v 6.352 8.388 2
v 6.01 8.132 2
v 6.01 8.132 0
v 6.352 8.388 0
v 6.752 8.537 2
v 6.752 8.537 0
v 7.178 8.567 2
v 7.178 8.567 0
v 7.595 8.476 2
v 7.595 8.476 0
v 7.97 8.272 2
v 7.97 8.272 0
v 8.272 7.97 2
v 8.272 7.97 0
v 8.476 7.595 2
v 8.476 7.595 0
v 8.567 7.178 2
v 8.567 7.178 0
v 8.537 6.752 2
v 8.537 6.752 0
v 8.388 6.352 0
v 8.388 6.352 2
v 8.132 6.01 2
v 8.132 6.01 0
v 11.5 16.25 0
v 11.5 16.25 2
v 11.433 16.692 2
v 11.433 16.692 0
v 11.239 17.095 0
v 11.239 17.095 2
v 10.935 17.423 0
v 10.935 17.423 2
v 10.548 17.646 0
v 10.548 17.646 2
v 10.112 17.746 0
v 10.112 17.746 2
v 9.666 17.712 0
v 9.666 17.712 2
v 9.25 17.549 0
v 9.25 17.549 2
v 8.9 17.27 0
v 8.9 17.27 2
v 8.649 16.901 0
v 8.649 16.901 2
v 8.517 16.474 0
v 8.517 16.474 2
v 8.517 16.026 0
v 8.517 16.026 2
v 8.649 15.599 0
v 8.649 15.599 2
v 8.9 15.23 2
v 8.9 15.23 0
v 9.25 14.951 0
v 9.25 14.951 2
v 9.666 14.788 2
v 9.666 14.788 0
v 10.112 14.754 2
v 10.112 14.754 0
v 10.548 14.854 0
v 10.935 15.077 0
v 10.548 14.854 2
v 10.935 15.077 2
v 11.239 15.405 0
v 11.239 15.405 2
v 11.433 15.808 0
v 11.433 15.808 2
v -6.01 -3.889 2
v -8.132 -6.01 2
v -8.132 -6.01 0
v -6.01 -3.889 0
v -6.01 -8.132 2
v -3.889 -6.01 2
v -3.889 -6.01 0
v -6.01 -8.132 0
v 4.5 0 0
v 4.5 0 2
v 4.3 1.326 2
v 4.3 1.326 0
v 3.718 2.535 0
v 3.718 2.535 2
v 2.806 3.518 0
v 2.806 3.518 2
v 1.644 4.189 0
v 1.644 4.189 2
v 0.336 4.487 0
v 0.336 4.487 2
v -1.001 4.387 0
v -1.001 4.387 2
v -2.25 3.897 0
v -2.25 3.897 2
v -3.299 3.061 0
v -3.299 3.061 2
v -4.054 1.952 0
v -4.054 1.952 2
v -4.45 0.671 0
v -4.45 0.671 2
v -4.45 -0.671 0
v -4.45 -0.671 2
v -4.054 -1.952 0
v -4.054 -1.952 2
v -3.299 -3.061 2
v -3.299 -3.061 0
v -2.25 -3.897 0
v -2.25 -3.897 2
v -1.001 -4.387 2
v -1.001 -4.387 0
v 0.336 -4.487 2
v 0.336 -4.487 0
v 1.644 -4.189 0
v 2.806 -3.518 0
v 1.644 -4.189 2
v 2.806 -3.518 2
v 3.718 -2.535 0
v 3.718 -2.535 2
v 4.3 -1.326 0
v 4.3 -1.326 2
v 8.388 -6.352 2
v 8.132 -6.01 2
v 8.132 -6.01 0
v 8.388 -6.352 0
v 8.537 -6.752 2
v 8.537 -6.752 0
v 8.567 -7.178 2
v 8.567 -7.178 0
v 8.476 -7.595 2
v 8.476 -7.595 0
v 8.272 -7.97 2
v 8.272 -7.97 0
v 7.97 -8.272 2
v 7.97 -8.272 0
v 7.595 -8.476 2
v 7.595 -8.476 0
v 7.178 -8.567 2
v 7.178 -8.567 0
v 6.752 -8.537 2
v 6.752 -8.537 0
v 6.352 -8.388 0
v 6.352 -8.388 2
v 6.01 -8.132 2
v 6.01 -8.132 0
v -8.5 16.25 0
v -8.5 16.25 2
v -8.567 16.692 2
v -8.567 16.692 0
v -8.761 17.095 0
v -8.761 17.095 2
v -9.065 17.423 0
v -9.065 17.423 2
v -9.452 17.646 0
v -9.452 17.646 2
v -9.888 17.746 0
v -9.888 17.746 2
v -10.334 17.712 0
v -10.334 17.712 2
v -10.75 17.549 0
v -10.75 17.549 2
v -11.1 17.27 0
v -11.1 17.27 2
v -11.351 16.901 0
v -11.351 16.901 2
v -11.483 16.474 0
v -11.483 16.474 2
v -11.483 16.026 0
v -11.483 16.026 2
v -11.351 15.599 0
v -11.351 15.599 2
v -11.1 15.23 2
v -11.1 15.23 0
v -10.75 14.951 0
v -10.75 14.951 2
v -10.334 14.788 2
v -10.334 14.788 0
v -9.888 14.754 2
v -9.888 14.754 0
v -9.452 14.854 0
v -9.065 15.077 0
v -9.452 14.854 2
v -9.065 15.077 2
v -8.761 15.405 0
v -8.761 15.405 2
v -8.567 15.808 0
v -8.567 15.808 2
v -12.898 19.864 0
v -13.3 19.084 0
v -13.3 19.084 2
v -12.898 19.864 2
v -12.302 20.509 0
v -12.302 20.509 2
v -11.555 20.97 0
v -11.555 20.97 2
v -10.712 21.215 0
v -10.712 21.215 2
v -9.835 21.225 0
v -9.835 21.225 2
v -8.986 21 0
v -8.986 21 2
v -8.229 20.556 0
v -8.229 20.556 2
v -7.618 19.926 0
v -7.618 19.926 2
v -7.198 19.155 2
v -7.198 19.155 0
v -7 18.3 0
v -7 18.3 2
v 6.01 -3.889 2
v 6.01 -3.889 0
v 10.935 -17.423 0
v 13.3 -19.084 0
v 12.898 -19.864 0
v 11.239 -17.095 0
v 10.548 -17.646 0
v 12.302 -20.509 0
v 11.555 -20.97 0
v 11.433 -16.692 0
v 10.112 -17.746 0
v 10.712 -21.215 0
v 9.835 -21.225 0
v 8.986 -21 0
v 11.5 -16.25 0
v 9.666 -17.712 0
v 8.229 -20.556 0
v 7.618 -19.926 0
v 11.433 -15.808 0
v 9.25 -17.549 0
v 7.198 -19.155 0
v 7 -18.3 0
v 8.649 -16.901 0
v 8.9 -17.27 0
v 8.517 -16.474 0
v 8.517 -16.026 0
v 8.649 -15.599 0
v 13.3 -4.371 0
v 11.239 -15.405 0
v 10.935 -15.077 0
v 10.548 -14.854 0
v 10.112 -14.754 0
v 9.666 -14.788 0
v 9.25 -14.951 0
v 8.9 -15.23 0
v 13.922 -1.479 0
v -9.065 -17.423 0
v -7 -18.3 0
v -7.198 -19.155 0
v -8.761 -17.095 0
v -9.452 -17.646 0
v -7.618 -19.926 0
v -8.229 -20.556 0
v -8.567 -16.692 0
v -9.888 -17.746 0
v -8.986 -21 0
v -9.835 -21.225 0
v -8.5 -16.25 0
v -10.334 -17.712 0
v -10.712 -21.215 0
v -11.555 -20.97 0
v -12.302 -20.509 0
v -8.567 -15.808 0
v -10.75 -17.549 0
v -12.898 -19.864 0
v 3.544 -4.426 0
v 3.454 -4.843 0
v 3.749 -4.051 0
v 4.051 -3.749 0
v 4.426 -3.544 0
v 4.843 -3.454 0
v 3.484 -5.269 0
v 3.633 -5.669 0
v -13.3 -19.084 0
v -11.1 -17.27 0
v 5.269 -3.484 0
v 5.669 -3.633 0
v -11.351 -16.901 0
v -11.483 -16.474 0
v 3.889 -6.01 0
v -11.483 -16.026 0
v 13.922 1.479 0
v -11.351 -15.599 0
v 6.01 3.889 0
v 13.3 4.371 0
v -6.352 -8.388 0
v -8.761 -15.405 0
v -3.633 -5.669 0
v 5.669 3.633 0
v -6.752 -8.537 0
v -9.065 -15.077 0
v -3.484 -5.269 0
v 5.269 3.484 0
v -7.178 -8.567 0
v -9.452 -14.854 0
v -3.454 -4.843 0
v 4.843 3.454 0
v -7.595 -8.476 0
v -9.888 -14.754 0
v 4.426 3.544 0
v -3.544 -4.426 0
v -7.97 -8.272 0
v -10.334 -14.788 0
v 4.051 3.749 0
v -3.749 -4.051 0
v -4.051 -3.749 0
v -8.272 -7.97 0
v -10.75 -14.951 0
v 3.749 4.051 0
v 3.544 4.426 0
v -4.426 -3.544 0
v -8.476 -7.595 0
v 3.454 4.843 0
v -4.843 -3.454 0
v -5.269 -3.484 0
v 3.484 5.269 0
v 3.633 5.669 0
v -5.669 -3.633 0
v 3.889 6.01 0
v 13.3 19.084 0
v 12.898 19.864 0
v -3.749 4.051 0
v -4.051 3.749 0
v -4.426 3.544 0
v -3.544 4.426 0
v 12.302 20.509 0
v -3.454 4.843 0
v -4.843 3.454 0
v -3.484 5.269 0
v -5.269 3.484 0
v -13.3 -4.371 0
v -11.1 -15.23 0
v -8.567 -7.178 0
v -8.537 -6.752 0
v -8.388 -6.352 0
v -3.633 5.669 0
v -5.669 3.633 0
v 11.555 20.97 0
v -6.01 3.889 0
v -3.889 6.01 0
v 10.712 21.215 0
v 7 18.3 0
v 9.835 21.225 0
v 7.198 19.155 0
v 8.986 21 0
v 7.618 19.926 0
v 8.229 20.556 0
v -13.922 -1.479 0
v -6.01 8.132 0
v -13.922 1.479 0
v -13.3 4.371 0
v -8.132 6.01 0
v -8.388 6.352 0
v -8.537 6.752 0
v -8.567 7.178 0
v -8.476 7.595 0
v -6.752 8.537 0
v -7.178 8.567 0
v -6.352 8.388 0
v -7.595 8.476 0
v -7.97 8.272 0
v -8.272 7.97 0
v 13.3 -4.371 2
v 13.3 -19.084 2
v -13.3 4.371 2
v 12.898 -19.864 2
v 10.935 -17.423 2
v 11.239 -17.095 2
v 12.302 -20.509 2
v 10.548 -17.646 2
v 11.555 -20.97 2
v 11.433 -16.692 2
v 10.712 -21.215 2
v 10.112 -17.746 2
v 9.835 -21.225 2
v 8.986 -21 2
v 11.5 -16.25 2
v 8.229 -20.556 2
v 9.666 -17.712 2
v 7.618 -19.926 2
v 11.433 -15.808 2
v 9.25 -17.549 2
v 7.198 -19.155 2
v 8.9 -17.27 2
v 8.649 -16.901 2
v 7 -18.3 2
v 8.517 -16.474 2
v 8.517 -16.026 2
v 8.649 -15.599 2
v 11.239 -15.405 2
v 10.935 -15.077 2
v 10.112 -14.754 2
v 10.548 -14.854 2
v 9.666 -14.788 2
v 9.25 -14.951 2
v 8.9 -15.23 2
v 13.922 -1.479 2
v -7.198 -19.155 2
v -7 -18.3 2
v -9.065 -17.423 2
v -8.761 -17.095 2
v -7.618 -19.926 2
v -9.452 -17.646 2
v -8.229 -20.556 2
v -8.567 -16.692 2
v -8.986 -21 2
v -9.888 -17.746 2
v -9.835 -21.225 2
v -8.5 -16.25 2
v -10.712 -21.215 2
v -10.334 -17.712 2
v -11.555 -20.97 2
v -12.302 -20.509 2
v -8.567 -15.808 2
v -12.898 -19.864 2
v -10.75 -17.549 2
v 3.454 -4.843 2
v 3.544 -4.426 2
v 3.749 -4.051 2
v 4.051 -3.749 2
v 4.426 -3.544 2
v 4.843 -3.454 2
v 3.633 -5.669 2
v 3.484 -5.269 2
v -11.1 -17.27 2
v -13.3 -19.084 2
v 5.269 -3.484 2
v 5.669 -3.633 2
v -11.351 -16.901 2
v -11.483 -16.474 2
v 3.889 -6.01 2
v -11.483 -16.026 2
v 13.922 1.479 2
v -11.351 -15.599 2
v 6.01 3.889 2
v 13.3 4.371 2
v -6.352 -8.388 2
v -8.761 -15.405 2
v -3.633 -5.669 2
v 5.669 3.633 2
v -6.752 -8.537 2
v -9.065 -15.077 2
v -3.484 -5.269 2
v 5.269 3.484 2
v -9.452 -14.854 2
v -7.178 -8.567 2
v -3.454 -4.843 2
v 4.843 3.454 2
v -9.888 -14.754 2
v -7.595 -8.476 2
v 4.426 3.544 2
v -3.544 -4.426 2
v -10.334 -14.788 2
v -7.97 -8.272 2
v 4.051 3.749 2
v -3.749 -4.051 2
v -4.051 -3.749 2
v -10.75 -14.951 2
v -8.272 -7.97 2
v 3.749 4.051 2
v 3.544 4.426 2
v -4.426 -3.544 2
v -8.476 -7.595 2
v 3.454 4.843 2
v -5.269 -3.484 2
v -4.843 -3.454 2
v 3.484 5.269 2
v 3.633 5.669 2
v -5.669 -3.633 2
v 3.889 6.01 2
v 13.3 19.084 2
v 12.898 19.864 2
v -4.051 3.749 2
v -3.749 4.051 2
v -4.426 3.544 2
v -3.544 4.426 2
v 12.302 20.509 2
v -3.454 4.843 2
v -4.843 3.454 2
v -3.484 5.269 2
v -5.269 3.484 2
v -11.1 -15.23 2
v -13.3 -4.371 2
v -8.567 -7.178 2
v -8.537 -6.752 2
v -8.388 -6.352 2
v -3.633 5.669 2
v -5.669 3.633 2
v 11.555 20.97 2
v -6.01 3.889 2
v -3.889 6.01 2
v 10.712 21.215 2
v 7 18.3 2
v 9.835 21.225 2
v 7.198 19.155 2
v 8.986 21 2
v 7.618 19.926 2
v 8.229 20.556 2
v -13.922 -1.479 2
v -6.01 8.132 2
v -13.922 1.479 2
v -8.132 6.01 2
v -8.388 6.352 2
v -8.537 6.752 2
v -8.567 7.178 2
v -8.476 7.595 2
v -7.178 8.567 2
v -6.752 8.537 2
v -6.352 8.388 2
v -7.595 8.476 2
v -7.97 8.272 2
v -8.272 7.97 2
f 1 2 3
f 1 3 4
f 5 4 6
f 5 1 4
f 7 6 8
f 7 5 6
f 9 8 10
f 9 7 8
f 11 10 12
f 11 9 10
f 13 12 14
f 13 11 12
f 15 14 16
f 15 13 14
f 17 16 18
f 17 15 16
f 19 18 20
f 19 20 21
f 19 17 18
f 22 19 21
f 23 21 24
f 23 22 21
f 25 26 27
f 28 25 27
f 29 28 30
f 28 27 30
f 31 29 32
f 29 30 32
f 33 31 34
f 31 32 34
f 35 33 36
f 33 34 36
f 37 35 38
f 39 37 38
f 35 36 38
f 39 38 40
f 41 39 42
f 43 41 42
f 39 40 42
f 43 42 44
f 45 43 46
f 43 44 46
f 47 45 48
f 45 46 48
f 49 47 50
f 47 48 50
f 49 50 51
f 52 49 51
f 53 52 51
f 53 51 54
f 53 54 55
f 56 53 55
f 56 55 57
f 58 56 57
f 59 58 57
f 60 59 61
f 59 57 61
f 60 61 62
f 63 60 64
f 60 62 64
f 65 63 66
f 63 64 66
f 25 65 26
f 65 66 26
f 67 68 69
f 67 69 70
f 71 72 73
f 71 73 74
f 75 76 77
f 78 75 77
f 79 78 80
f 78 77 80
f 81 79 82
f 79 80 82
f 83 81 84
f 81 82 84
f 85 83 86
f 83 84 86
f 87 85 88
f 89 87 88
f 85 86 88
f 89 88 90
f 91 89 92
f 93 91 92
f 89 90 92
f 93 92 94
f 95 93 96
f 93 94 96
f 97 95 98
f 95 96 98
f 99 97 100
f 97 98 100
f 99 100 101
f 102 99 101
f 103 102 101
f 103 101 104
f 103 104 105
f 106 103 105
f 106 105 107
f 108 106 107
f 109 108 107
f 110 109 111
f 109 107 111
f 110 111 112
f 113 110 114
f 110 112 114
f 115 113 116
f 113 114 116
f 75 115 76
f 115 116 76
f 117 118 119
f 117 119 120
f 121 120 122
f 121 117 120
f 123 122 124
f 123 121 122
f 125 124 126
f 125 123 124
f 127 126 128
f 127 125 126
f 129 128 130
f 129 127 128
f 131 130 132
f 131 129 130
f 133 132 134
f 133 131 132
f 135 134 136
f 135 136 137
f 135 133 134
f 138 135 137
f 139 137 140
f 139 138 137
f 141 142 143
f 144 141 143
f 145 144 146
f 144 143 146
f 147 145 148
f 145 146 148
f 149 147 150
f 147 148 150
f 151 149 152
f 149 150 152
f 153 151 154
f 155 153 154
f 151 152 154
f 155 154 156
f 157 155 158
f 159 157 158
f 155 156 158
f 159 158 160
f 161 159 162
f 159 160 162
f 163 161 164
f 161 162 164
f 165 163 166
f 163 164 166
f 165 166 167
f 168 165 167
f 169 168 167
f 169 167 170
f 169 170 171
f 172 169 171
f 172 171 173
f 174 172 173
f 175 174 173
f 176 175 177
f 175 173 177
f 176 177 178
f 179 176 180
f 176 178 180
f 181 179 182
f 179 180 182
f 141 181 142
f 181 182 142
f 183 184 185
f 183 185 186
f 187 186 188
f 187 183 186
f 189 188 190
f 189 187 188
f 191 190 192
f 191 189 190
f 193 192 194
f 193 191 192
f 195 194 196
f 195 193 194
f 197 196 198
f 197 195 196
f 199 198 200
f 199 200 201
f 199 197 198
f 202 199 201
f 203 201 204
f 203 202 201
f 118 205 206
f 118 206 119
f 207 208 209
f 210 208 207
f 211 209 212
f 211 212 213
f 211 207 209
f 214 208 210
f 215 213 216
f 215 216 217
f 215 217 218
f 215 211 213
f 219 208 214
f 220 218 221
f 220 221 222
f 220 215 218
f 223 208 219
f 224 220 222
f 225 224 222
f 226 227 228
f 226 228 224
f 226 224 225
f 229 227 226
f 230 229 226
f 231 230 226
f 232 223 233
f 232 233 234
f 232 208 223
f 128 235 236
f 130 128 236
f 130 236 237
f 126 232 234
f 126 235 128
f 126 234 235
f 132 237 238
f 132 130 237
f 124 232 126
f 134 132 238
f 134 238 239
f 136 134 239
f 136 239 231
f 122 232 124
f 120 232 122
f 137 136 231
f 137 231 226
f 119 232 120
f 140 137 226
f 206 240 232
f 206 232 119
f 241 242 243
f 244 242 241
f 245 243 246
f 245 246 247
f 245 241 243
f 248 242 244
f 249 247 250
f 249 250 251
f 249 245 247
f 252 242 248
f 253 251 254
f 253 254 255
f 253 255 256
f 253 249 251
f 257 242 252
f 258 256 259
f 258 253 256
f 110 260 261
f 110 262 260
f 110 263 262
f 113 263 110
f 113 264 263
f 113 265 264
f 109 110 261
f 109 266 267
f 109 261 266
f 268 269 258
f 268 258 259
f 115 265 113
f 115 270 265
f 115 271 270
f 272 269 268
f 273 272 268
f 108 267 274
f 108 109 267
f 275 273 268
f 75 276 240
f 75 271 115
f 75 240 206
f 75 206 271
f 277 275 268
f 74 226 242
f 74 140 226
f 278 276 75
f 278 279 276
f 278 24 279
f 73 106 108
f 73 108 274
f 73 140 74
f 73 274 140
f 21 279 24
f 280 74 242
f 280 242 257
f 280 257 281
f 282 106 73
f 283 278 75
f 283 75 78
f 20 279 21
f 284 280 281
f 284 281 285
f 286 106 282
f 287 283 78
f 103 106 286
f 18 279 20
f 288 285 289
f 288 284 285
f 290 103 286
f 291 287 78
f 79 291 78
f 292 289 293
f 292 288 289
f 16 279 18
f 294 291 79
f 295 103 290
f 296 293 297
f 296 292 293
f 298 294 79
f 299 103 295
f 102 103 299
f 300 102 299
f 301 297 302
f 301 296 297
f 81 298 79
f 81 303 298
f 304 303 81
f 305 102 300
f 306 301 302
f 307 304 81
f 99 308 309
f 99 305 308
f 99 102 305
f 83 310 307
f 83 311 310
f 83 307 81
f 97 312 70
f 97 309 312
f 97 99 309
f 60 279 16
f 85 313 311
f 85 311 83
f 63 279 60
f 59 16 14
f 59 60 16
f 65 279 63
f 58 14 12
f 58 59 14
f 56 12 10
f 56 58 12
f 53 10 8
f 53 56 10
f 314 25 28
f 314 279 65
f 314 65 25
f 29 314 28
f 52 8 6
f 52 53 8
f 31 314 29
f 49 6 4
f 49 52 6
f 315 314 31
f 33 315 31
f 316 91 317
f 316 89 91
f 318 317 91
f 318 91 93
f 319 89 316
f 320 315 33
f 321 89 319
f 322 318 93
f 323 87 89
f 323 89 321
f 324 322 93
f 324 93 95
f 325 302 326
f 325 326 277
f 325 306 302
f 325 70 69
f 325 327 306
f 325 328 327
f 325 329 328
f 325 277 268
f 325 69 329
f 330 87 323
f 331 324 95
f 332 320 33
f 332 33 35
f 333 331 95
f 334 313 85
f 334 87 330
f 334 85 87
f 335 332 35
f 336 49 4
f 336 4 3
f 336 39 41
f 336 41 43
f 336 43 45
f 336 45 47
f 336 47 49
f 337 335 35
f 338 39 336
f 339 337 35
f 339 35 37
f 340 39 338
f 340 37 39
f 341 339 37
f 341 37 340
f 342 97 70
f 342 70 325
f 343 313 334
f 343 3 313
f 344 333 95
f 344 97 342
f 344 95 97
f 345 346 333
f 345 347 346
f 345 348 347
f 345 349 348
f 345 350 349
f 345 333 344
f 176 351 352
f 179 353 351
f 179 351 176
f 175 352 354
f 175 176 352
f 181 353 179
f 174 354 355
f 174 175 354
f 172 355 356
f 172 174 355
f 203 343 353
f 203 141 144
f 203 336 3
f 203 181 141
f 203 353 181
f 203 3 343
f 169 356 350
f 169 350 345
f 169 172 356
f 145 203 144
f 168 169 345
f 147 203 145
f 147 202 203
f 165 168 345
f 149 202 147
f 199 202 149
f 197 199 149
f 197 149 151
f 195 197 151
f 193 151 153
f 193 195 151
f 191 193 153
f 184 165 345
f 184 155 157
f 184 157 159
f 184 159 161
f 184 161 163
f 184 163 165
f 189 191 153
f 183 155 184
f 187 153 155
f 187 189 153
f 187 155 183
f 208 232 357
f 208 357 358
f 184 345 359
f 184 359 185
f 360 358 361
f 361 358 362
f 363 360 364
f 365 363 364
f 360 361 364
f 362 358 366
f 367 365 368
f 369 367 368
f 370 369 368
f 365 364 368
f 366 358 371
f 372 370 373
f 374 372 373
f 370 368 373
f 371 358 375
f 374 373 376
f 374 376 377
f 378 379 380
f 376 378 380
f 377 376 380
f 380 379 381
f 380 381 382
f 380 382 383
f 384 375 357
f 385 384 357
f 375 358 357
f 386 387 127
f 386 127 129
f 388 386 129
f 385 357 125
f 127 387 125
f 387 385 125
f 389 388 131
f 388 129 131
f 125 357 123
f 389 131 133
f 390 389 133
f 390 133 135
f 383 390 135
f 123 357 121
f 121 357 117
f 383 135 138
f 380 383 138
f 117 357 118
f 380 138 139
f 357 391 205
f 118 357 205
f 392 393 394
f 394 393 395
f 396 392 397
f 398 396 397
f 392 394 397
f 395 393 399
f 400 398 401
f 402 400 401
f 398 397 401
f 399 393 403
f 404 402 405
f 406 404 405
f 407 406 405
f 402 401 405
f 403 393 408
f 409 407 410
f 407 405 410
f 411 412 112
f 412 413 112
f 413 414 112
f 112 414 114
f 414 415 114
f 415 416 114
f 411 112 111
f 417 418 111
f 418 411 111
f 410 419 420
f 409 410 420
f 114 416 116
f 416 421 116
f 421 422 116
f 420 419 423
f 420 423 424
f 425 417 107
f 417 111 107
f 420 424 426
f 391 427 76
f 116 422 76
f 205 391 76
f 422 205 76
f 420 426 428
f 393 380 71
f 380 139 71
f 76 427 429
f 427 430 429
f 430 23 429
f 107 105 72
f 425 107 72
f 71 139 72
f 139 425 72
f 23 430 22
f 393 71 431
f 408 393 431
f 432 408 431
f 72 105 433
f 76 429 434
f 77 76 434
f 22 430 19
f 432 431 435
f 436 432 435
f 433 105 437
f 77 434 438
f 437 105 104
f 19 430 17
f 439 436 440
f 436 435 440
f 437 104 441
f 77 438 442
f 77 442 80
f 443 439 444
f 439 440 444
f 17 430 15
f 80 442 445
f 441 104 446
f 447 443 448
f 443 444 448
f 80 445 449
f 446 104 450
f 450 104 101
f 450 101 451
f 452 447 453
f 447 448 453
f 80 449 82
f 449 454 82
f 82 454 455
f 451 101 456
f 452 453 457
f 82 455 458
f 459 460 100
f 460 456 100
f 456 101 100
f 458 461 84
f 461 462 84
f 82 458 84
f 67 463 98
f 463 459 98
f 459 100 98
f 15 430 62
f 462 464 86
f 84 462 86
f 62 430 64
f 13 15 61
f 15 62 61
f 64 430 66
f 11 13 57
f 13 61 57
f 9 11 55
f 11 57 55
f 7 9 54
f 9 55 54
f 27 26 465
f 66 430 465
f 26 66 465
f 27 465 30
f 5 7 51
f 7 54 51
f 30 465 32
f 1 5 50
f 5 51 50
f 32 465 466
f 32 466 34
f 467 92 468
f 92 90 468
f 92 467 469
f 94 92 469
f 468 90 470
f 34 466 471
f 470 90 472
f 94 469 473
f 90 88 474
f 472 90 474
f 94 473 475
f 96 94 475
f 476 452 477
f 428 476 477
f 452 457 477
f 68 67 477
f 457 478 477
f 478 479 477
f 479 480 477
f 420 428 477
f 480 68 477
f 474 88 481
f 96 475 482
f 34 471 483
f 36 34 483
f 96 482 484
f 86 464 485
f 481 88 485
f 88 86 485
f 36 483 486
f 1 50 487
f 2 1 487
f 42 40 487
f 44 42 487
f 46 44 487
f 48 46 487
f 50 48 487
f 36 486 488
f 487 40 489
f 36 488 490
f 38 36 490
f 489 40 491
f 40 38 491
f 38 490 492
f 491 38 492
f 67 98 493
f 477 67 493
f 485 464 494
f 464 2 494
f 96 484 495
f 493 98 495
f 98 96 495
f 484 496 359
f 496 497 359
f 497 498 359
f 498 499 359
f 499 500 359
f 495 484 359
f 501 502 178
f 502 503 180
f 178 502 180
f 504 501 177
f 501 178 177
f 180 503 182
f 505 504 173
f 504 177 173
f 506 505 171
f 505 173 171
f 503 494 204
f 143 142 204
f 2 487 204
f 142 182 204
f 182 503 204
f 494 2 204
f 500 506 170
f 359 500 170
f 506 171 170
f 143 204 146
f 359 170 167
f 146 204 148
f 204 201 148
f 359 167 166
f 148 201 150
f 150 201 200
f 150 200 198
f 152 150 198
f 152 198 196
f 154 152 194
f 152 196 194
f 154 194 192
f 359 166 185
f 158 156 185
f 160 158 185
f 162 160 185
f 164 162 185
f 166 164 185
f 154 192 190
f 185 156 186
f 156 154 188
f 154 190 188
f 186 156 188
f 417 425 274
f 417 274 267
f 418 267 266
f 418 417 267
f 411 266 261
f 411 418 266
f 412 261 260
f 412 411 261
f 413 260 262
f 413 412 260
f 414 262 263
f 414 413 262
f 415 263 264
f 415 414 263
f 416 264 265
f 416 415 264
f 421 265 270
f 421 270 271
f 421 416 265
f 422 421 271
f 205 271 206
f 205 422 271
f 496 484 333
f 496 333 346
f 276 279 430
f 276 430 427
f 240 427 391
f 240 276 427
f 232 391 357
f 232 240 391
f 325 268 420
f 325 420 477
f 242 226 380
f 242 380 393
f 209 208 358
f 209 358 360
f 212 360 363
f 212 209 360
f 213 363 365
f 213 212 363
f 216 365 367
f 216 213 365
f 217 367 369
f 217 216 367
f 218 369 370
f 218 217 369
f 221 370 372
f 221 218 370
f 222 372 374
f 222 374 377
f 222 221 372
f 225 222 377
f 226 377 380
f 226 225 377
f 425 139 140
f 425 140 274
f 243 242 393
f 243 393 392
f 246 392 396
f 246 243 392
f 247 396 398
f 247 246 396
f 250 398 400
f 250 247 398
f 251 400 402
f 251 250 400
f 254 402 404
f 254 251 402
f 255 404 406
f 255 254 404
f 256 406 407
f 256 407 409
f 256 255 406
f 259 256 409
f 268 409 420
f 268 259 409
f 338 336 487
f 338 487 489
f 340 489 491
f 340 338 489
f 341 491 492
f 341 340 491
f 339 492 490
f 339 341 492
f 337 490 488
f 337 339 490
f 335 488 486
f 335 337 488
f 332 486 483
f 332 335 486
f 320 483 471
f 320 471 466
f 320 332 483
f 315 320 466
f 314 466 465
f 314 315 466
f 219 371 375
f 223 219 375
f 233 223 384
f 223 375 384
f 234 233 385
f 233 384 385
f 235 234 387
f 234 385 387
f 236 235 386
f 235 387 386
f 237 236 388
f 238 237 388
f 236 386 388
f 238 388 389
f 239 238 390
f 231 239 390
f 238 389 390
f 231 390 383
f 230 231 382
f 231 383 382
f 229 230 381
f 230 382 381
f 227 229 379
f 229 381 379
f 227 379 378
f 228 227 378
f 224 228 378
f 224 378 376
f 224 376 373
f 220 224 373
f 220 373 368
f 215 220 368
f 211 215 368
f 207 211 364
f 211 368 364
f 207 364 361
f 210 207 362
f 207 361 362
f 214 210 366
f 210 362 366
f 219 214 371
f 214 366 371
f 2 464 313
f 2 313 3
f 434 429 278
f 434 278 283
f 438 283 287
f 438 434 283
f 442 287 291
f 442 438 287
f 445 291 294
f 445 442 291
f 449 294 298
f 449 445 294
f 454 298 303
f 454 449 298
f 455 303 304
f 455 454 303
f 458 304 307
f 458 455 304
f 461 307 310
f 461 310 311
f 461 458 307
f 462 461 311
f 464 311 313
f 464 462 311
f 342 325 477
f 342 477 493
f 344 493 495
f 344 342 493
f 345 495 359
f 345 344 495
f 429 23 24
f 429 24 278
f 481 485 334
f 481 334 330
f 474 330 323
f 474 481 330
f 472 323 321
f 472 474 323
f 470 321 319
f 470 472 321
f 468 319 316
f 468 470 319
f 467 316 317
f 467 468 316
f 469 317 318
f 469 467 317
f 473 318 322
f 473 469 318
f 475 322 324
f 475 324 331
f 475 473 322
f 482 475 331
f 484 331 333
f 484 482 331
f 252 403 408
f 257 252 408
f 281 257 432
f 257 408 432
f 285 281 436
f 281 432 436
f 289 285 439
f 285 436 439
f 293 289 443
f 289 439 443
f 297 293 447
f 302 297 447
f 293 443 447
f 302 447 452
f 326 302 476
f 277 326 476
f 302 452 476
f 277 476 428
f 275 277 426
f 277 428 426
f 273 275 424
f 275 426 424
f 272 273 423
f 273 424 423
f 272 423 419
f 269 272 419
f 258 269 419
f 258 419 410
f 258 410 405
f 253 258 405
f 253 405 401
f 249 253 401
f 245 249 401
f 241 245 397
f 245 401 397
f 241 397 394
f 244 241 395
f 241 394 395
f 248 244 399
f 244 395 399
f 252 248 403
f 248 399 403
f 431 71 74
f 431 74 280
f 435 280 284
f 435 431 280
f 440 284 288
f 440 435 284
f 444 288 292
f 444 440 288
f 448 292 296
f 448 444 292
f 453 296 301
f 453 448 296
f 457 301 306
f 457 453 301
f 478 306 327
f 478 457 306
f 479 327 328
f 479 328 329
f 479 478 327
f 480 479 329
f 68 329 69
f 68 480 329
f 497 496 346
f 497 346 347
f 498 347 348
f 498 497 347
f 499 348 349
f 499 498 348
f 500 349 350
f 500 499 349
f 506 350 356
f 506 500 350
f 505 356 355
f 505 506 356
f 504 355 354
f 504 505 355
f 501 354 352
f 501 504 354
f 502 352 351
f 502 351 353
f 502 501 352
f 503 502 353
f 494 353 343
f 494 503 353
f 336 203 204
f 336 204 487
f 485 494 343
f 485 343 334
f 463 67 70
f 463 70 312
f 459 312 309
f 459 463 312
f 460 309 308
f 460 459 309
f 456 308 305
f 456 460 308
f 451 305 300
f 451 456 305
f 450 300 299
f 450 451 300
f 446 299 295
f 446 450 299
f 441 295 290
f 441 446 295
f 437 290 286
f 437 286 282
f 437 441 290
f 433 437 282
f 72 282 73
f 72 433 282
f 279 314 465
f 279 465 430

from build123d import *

# Parameters (mm, degrees)
BOSS_EXTRUDE1_DEPTH = 2
SKETCH2_R           = 4.5
SKETCH2_R_2         = 1.5
CUT_EXTRUDE1_DEPTH  = 2


with BuildPart() as part:
    # Sketch1 → Boss-Extrude1 (new body)
    with BuildSketch(Plane.XY):
        with BuildLine():
            Line((-13.3, 4.371498599), (-13.3, 18.3))
            Line((-13.3, 18.3), (-13.3, 19.084050384))
            ThreePointArc((-13.3, 19.084050384), (-9.834750168, 21.225119977), (-7, 18.3))
            Line((-7, 18.3), (7, 18.3))
            ThreePointArc((7, 18.3), (9.834750168, 21.225119977), (13.3, 19.084050384))
            Line((13.3, 19.084050384), (13.3, 18.3))
            Line((13.3, 18.3), (13.3, 4.371498599))
            ThreePointArc((13.3, 4.371498599), (14, 0), (13.3, -4.371498599))
            Line((13.3, -4.371498599), (13.3, -18.3))
            Line((13.3, -18.3), (13.3, -19.084050384))
            ThreePointArc((13.3, -19.084050384), (9.834750168, -21.225119977), (7, -18.3))
            Line((7, -18.3), (-7, -18.3))
            ThreePointArc((-7, -18.3), (-9.834750168, -21.225119977), (-13.3, -19.084050384))
            Line((-13.3, -19.084050384), (-13.3, -18.3))
            Line((-13.3, -18.3), (-13.3, -4.371498599))
            ThreePointArc((-13.3, -4.371498599), (-14, 0), (-13.3, 4.371498599))
        make_face()
    extrude(amount=BOSS_EXTRUDE1_DEPTH)

    # Sketch2 → Cut-Extrude1 (cut)
    with BuildSketch(Plane.XY.offset(2)):
        Circle(SKETCH2_R)
        with Locations((-10, 16.25)):
            Circle(SKETCH2_R_2)
        with Locations((10, 16.25)):
            Circle(SKETCH2_R_2)
        with Locations((-10, -16.25)):
            Circle(SKETCH2_R_2)
        with Locations((10, -16.25)):
            Circle(SKETCH2_R_2)
        with BuildLine():
            Line((3.889087297, 6.01040764), (6.01040764, 8.131727984))
            ThreePointArc((6.01040764, 8.131727984), (8.131727984, 8.131727984), (8.131727984, 6.01040764))
            Line((8.131727984, 6.01040764), (6.01040764, 3.889087297))
            ThreePointArc((6.01040764, 3.889087297), (3.889087297, 3.889087297), (3.889087297, 6.01040764))
        make_face()
        with BuildLine():
            Line((6.01040764, -3.889087297), (8.131727984, -6.01040764))
            ThreePointArc((8.131727984, -6.01040764), (8.131727984, -8.131727984), (6.01040764, -8.131727984))
            Line((6.01040764, -8.131727984), (3.889087297, -6.01040764))
            ThreePointArc((3.889087297, -6.01040764), (3.889087297, -3.889087297), (6.01040764, -3.889087297))
        make_face()
        with BuildLine():
            Line((-3.889087297, -6.01040764), (-6.01040764, -8.131727984))
            ThreePointArc((-6.01040764, -8.131727984), (-8.131727984, -8.131727984), (-8.131727984, -6.01040764))
            Line((-8.131727984, -6.01040764), (-6.01040764, -3.889087297))
            ThreePointArc((-6.01040764, -3.889087297), (-3.889087297, -3.889087297), (-3.889087297, -6.01040764))
        make_face()
        with BuildLine():
            Line((-6.01040764, 3.889087297), (-8.131727984, 6.01040764))
            ThreePointArc((-8.131727984, 6.01040764), (-8.131727984, 8.131727984), (-6.01040764, 8.131727984))
            Line((-6.01040764, 8.131727984), (-3.889087297, 6.01040764))
            ThreePointArc((-3.889087297, 6.01040764), (-3.889087297, 3.889087297), (-6.01040764, 3.889087297))
        make_face()
    extrude(amount=-CUT_EXTRUDE1_DEPTH, mode=Mode.SUBTRACT)


solid = part.part
